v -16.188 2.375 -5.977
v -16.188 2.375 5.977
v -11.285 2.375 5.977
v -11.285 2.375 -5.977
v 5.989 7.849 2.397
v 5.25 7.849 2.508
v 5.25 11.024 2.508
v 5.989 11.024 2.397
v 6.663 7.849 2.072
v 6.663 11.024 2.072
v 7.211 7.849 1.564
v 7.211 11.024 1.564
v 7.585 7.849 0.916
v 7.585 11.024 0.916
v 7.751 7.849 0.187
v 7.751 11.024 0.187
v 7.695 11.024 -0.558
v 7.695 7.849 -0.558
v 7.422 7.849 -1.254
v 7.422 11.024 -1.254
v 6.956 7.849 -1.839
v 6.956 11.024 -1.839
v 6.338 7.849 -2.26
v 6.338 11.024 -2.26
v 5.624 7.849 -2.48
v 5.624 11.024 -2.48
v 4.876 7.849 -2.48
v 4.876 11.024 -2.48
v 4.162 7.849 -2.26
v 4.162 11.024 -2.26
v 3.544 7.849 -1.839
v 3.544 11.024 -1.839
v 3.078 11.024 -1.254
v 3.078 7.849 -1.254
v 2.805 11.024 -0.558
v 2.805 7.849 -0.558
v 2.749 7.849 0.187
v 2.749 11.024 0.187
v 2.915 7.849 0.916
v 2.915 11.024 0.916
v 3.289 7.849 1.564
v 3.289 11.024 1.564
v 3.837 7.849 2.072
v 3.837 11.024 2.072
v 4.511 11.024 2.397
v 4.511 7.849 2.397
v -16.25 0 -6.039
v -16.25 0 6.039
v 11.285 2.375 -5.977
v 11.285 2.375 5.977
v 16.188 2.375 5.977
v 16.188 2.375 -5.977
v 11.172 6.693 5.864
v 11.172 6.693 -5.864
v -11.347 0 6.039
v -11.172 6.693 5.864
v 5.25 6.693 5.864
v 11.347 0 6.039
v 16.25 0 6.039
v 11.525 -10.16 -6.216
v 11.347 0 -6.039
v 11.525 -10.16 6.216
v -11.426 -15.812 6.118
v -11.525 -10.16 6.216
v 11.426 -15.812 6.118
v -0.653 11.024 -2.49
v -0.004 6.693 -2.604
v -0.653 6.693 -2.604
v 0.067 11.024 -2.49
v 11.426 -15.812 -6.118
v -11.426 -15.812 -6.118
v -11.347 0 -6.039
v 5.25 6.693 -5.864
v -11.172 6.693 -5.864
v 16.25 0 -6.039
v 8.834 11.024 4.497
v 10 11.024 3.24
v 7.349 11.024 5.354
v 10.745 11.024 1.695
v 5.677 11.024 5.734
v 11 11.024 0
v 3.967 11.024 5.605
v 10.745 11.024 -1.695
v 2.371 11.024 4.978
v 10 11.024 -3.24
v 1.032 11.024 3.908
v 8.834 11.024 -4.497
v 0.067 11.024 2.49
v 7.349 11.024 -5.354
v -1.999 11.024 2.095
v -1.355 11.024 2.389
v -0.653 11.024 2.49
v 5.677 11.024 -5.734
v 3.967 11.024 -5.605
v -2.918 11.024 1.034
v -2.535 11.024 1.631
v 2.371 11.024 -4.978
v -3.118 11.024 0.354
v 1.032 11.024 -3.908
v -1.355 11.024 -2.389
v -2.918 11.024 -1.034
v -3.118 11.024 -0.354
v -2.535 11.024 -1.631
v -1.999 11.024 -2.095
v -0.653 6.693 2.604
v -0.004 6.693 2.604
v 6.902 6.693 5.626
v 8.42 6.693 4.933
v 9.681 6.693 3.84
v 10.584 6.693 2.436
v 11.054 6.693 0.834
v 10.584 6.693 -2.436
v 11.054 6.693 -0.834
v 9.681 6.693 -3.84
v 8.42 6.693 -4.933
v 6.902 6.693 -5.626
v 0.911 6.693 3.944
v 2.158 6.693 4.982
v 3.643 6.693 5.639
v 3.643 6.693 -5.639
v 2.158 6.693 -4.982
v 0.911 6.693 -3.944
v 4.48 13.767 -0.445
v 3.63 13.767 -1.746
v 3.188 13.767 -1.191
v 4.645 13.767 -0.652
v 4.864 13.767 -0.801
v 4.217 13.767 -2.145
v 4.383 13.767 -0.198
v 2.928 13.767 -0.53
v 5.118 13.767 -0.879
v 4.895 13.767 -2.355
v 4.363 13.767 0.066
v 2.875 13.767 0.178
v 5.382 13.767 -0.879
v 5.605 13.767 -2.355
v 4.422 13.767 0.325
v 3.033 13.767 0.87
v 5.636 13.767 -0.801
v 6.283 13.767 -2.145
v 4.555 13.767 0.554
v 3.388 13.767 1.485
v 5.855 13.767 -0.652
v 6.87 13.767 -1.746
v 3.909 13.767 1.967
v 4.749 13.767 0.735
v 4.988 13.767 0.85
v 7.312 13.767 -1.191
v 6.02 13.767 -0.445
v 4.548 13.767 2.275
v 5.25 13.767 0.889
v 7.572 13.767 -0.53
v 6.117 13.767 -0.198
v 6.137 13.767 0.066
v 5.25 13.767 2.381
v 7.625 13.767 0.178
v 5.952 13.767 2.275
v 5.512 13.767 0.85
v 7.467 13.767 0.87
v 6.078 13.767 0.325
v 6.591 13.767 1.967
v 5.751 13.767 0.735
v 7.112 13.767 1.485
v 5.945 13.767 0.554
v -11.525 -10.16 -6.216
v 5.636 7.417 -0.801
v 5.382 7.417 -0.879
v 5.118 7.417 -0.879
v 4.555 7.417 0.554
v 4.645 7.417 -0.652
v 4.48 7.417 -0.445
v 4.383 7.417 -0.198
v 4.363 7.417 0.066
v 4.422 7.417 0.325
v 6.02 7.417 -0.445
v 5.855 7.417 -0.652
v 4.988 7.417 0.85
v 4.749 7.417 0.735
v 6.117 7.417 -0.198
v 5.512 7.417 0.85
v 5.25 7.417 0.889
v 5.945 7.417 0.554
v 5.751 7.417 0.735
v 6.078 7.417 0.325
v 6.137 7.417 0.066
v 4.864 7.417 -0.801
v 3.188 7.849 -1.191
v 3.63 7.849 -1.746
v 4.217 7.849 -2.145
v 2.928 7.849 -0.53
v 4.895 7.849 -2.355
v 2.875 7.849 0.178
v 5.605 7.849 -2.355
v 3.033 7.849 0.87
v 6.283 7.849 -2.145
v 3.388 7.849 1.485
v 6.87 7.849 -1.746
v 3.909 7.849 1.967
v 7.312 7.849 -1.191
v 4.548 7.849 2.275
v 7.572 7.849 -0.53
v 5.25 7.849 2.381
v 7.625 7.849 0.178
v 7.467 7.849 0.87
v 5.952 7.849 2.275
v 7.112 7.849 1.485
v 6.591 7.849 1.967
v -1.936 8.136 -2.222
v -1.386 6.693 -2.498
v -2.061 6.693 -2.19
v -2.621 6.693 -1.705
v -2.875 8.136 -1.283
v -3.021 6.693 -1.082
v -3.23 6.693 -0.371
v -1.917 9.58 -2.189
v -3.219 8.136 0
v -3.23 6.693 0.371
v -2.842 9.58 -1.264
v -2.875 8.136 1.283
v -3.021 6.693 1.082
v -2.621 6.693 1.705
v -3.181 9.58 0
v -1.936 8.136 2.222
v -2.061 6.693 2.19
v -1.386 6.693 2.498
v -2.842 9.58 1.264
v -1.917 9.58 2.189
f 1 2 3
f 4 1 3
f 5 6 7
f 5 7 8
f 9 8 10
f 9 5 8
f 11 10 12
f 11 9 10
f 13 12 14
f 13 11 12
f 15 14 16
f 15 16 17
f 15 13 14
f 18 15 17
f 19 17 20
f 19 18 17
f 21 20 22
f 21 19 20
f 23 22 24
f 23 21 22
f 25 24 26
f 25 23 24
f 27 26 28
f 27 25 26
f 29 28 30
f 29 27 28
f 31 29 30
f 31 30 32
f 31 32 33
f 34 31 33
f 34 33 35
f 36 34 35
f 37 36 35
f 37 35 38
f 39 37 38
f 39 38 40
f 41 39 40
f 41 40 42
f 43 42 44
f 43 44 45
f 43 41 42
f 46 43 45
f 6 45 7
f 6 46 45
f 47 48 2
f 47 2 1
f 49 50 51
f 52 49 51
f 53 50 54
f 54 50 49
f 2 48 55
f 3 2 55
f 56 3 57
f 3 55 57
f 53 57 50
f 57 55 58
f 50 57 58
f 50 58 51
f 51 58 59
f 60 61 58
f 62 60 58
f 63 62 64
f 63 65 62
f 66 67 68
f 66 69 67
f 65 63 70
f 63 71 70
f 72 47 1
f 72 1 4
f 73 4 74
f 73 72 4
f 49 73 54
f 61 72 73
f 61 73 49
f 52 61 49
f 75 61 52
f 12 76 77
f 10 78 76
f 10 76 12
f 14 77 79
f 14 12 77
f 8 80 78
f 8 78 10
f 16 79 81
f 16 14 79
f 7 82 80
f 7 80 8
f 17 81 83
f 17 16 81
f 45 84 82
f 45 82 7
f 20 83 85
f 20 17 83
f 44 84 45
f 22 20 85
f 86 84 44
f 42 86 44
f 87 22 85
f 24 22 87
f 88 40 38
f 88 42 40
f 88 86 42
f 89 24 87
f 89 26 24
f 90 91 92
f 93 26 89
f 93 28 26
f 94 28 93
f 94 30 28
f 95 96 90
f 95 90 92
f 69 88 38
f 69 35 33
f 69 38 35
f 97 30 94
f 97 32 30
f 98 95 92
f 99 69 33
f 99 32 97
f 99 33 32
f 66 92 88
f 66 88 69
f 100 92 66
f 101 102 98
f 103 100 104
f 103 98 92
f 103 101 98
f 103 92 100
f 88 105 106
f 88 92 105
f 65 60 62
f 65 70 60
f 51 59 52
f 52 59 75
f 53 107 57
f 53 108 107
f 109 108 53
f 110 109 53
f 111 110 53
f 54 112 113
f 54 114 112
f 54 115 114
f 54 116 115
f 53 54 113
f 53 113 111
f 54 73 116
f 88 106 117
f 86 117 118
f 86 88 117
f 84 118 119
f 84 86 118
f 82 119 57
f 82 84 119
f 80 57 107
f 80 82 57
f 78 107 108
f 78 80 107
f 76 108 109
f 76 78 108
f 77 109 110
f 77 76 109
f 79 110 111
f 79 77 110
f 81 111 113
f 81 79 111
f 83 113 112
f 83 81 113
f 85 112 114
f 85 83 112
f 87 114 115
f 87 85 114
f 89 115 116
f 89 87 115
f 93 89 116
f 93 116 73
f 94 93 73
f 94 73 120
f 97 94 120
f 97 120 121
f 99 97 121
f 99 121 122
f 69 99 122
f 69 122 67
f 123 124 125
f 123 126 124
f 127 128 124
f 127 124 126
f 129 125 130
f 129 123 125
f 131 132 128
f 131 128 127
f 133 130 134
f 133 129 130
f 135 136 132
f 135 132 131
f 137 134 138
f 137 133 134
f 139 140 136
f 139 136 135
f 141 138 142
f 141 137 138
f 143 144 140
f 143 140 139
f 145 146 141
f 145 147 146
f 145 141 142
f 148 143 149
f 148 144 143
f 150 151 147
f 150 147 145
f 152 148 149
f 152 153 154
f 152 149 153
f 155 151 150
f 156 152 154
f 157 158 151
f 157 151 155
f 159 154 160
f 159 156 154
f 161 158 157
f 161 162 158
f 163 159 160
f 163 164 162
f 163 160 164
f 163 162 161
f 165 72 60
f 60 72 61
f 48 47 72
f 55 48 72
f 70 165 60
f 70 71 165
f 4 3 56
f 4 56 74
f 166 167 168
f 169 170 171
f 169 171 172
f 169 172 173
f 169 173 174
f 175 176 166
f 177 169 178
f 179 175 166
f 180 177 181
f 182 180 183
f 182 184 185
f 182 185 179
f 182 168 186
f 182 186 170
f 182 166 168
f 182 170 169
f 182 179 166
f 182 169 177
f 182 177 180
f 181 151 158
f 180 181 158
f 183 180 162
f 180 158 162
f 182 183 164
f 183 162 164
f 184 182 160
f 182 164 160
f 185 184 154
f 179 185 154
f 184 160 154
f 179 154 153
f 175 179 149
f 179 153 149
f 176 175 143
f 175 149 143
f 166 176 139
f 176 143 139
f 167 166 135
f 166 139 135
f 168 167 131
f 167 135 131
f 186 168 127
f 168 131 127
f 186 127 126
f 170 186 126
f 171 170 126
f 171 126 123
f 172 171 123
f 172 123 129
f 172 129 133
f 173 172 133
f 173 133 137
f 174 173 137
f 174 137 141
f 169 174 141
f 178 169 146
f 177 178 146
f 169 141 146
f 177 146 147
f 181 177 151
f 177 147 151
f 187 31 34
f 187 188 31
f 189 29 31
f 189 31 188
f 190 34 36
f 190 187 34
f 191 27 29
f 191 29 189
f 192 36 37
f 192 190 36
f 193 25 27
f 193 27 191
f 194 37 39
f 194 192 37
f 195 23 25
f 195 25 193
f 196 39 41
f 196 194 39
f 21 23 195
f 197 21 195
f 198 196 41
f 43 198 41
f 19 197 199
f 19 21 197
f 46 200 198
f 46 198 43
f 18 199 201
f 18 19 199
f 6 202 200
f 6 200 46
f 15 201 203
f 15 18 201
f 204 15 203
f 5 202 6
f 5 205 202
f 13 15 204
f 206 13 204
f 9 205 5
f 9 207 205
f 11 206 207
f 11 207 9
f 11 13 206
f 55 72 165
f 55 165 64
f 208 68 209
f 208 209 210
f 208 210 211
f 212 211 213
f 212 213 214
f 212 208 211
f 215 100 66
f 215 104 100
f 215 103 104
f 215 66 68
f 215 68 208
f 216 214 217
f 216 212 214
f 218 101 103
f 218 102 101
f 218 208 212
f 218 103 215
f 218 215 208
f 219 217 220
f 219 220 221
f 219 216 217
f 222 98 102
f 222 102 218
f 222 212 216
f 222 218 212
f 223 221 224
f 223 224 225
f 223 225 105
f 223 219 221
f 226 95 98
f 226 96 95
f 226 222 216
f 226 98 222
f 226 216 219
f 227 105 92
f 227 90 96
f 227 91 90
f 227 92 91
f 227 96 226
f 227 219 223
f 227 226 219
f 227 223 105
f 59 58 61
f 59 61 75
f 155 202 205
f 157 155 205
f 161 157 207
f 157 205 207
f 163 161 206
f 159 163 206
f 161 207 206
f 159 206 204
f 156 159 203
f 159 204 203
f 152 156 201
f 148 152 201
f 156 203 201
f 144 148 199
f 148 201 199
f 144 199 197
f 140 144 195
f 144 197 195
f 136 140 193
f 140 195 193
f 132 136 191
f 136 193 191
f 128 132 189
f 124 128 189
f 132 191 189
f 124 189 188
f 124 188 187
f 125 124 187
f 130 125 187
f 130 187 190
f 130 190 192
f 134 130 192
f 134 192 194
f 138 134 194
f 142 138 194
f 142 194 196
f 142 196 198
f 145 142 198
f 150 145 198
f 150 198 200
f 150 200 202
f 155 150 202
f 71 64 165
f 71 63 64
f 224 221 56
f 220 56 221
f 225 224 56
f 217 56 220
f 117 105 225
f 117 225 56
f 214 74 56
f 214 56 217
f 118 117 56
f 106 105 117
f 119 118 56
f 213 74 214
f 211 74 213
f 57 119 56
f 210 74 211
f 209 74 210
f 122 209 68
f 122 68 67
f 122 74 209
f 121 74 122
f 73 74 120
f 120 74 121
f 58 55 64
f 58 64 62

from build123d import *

# Parameters (mm, degrees)
SKETCH8_W                 = 32.5
SKETCH8_H                 = 12.0777
BODY_MOUNTING_PLATE_DEPTH = 2.3749
SKETCH9_W                 = 22.6949
SKETCH9_H                 = 12.0777
BODY_TOP_DEPTH            = 4.318
BODY_TOP_DRAFT_1_5_ANGLE  = -1.5
SKETCH10_W                = 22.6949
SKETCH10_H                = 12.0777
BODY_MIDDLE_DEPTH         = 10.16
BODY_MIDDLE_DRAFT         = -1
SKETCH11_W                = 23.04958692
SKETCH11_H                = 12.43238692
BODY_BODOM_DEPTH          = 5.6515
BODY_BODOM_TAPER          = 1
BODY_TOPPER_DEPTH         = 4.3307
BODY_TOPPER_TAPER         = 1.5
SKETCH13_R                = 2.38125
SPINDLE_DEPTH             = 2.7432
SPINDLE_START             = -3.175
SKETCH18_R                = 2.50825
SKETCH18_R_2              = 2.38125
SPINDLE_OPENING_DEPTH     = 3.175
SKETCH14_R                = 0.889
SPINDLE_SCREW_HOLE_DEPTH  = 6.35


with BuildPart() as part:
    # Sketch8 → Body Mounting Plate (new body)
    with BuildSketch(Plane(origin=(0, 0, 0), x_dir=(1, 0, 0), z_dir=(0, 1, 0))):
        Rectangle(SKETCH8_W, SKETCH8_H)
    extrude(amount=BODY_MOUNTING_PLATE_DEPTH)

    # Sketch9 → Body Top (add)
    with BuildSketch(Plane(origin=(0, 2.3749, 0), x_dir=(1, 0, 0), z_dir=(0, 1, 0))):
        Rectangle(SKETCH9_W, SKETCH9_H)
    extrude(amount=BODY_TOP_DEPTH)

    # Body Top Draft 1.5
    body_top_draft_1_5_faces = [part.faces().sort_by_distance(p)[0] for p in [
        (11.34745, 4.5339, 0),
        (16.25, 1.18745, 0),
        (0, 3.059462209, -6.03885),
        (-11.34745, 4.5339, 0),
        (-16.25, 1.18745, 0),
        (0, 3.059462209, 6.03885),
    ]]
    draft(body_top_draft_1_5_faces, Plane(origin=(0, 0, 0), x_dir=(0, 0, -1), z_dir=(0, -1, 0)), BODY_TOP_DRAFT_1_5_ANGLE)


with BuildPart() as body_middle_tool:
    # Sketch10 → Body Middle (with draft: the straight prism first)
    with BuildSketch(Plane.XZ):
        Rectangle(SKETCH10_W, SKETCH10_H)
    extrude(amount=BODY_MIDDLE_DEPTH)
    # Body Middle: the draft: its side faces are tilted about the plane it starts from
    body_middle_sides = [body_middle_tool.faces().sort_by_distance(p)[0] for p in [
        (0, -5.08, 6.03885),
        (-11.34745, -5.08, 0),
        (0, -5.08, -6.03885),
        (11.34745, -5.08, 0),
    ]]
    draft(body_middle_sides, Plane.XZ, BODY_MIDDLE_DRAFT)


with BuildPart() as part_1:
    add(part.part)

    # Body Middle: add body_middle_tool
    add(body_middle_tool.part)

    # Sketch11 → Body Bodom (add)
    with BuildSketch(Plane.XZ.offset(10.16)):
        Rectangle(SKETCH11_W, SKETCH11_H)
    extrude(amount=BODY_BODOM_DEPTH, taper=BODY_BODOM_TAPER)

    # Sketch12 → Body Topper (add)
    with BuildSketch(Plane(origin=(0, 6.6929, 0), x_dir=(1, 0, 0), z_dir=(0, 1, 0))):
        with BuildLine():
            ThreePointArc((-0.652959754, 2.6035), (-3.256459754, 0), (-0.652959754, -2.6035))
            Line((-0.652959754, -2.6035), (-0.003901247, -2.6035))
            ThreePointArc((-0.003901247, -2.6035), (11.113590246, 0), (-0.003901247, 2.6035))
            Line((-0.003901247, 2.6035), (-0.652959754, 2.6035))
        make_face()
    extrude(amount=BODY_TOPPER_DEPTH, taper=BODY_TOPPER_TAPER)

    # Sketch13 → Spindle (add)
    with BuildSketch(Plane(origin=(0, 11.0236, 0), x_dir=(1, 0, 0), z_dir=(0, 1, 0))):
        with Locations(Location((5.25, 0, 0), (0, 0, 270))):
            Circle(SKETCH13_R)
    extrude(amount=SPINDLE_DEPTH)

    # Sketch18 → Spindle Opening (cut)
    with BuildSketch(Plane(origin=(0, 11.0236, 0), x_dir=(1, 0, 0), z_dir=(0, 1, 0)).offset(SPINDLE_START)):
        with Locations(Location((5.25, 0, 0), (0, 0, 270))):
            Circle(SKETCH18_R)
        with Locations(Location((5.25, 0, 0), (0, 0, 270))):
            Circle(SKETCH18_R_2, mode=Mode.SUBTRACT)
    extrude(amount=SPINDLE_OPENING_DEPTH, mode=Mode.SUBTRACT)

    # Sketch14 → Spindle Screw Hole (cut)
    with BuildSketch(Plane(origin=(0, 13.7668, 0), x_dir=(1, 0, 0), z_dir=(0, 1, 0))):
        with Locations(Location((5.25, 0, 0), (0, 0, 270))):
            Circle(SKETCH14_R)
    extrude(amount=-SPINDLE_SCREW_HOLE_DEPTH, mode=Mode.SUBTRACT)


solid = part_1.part
